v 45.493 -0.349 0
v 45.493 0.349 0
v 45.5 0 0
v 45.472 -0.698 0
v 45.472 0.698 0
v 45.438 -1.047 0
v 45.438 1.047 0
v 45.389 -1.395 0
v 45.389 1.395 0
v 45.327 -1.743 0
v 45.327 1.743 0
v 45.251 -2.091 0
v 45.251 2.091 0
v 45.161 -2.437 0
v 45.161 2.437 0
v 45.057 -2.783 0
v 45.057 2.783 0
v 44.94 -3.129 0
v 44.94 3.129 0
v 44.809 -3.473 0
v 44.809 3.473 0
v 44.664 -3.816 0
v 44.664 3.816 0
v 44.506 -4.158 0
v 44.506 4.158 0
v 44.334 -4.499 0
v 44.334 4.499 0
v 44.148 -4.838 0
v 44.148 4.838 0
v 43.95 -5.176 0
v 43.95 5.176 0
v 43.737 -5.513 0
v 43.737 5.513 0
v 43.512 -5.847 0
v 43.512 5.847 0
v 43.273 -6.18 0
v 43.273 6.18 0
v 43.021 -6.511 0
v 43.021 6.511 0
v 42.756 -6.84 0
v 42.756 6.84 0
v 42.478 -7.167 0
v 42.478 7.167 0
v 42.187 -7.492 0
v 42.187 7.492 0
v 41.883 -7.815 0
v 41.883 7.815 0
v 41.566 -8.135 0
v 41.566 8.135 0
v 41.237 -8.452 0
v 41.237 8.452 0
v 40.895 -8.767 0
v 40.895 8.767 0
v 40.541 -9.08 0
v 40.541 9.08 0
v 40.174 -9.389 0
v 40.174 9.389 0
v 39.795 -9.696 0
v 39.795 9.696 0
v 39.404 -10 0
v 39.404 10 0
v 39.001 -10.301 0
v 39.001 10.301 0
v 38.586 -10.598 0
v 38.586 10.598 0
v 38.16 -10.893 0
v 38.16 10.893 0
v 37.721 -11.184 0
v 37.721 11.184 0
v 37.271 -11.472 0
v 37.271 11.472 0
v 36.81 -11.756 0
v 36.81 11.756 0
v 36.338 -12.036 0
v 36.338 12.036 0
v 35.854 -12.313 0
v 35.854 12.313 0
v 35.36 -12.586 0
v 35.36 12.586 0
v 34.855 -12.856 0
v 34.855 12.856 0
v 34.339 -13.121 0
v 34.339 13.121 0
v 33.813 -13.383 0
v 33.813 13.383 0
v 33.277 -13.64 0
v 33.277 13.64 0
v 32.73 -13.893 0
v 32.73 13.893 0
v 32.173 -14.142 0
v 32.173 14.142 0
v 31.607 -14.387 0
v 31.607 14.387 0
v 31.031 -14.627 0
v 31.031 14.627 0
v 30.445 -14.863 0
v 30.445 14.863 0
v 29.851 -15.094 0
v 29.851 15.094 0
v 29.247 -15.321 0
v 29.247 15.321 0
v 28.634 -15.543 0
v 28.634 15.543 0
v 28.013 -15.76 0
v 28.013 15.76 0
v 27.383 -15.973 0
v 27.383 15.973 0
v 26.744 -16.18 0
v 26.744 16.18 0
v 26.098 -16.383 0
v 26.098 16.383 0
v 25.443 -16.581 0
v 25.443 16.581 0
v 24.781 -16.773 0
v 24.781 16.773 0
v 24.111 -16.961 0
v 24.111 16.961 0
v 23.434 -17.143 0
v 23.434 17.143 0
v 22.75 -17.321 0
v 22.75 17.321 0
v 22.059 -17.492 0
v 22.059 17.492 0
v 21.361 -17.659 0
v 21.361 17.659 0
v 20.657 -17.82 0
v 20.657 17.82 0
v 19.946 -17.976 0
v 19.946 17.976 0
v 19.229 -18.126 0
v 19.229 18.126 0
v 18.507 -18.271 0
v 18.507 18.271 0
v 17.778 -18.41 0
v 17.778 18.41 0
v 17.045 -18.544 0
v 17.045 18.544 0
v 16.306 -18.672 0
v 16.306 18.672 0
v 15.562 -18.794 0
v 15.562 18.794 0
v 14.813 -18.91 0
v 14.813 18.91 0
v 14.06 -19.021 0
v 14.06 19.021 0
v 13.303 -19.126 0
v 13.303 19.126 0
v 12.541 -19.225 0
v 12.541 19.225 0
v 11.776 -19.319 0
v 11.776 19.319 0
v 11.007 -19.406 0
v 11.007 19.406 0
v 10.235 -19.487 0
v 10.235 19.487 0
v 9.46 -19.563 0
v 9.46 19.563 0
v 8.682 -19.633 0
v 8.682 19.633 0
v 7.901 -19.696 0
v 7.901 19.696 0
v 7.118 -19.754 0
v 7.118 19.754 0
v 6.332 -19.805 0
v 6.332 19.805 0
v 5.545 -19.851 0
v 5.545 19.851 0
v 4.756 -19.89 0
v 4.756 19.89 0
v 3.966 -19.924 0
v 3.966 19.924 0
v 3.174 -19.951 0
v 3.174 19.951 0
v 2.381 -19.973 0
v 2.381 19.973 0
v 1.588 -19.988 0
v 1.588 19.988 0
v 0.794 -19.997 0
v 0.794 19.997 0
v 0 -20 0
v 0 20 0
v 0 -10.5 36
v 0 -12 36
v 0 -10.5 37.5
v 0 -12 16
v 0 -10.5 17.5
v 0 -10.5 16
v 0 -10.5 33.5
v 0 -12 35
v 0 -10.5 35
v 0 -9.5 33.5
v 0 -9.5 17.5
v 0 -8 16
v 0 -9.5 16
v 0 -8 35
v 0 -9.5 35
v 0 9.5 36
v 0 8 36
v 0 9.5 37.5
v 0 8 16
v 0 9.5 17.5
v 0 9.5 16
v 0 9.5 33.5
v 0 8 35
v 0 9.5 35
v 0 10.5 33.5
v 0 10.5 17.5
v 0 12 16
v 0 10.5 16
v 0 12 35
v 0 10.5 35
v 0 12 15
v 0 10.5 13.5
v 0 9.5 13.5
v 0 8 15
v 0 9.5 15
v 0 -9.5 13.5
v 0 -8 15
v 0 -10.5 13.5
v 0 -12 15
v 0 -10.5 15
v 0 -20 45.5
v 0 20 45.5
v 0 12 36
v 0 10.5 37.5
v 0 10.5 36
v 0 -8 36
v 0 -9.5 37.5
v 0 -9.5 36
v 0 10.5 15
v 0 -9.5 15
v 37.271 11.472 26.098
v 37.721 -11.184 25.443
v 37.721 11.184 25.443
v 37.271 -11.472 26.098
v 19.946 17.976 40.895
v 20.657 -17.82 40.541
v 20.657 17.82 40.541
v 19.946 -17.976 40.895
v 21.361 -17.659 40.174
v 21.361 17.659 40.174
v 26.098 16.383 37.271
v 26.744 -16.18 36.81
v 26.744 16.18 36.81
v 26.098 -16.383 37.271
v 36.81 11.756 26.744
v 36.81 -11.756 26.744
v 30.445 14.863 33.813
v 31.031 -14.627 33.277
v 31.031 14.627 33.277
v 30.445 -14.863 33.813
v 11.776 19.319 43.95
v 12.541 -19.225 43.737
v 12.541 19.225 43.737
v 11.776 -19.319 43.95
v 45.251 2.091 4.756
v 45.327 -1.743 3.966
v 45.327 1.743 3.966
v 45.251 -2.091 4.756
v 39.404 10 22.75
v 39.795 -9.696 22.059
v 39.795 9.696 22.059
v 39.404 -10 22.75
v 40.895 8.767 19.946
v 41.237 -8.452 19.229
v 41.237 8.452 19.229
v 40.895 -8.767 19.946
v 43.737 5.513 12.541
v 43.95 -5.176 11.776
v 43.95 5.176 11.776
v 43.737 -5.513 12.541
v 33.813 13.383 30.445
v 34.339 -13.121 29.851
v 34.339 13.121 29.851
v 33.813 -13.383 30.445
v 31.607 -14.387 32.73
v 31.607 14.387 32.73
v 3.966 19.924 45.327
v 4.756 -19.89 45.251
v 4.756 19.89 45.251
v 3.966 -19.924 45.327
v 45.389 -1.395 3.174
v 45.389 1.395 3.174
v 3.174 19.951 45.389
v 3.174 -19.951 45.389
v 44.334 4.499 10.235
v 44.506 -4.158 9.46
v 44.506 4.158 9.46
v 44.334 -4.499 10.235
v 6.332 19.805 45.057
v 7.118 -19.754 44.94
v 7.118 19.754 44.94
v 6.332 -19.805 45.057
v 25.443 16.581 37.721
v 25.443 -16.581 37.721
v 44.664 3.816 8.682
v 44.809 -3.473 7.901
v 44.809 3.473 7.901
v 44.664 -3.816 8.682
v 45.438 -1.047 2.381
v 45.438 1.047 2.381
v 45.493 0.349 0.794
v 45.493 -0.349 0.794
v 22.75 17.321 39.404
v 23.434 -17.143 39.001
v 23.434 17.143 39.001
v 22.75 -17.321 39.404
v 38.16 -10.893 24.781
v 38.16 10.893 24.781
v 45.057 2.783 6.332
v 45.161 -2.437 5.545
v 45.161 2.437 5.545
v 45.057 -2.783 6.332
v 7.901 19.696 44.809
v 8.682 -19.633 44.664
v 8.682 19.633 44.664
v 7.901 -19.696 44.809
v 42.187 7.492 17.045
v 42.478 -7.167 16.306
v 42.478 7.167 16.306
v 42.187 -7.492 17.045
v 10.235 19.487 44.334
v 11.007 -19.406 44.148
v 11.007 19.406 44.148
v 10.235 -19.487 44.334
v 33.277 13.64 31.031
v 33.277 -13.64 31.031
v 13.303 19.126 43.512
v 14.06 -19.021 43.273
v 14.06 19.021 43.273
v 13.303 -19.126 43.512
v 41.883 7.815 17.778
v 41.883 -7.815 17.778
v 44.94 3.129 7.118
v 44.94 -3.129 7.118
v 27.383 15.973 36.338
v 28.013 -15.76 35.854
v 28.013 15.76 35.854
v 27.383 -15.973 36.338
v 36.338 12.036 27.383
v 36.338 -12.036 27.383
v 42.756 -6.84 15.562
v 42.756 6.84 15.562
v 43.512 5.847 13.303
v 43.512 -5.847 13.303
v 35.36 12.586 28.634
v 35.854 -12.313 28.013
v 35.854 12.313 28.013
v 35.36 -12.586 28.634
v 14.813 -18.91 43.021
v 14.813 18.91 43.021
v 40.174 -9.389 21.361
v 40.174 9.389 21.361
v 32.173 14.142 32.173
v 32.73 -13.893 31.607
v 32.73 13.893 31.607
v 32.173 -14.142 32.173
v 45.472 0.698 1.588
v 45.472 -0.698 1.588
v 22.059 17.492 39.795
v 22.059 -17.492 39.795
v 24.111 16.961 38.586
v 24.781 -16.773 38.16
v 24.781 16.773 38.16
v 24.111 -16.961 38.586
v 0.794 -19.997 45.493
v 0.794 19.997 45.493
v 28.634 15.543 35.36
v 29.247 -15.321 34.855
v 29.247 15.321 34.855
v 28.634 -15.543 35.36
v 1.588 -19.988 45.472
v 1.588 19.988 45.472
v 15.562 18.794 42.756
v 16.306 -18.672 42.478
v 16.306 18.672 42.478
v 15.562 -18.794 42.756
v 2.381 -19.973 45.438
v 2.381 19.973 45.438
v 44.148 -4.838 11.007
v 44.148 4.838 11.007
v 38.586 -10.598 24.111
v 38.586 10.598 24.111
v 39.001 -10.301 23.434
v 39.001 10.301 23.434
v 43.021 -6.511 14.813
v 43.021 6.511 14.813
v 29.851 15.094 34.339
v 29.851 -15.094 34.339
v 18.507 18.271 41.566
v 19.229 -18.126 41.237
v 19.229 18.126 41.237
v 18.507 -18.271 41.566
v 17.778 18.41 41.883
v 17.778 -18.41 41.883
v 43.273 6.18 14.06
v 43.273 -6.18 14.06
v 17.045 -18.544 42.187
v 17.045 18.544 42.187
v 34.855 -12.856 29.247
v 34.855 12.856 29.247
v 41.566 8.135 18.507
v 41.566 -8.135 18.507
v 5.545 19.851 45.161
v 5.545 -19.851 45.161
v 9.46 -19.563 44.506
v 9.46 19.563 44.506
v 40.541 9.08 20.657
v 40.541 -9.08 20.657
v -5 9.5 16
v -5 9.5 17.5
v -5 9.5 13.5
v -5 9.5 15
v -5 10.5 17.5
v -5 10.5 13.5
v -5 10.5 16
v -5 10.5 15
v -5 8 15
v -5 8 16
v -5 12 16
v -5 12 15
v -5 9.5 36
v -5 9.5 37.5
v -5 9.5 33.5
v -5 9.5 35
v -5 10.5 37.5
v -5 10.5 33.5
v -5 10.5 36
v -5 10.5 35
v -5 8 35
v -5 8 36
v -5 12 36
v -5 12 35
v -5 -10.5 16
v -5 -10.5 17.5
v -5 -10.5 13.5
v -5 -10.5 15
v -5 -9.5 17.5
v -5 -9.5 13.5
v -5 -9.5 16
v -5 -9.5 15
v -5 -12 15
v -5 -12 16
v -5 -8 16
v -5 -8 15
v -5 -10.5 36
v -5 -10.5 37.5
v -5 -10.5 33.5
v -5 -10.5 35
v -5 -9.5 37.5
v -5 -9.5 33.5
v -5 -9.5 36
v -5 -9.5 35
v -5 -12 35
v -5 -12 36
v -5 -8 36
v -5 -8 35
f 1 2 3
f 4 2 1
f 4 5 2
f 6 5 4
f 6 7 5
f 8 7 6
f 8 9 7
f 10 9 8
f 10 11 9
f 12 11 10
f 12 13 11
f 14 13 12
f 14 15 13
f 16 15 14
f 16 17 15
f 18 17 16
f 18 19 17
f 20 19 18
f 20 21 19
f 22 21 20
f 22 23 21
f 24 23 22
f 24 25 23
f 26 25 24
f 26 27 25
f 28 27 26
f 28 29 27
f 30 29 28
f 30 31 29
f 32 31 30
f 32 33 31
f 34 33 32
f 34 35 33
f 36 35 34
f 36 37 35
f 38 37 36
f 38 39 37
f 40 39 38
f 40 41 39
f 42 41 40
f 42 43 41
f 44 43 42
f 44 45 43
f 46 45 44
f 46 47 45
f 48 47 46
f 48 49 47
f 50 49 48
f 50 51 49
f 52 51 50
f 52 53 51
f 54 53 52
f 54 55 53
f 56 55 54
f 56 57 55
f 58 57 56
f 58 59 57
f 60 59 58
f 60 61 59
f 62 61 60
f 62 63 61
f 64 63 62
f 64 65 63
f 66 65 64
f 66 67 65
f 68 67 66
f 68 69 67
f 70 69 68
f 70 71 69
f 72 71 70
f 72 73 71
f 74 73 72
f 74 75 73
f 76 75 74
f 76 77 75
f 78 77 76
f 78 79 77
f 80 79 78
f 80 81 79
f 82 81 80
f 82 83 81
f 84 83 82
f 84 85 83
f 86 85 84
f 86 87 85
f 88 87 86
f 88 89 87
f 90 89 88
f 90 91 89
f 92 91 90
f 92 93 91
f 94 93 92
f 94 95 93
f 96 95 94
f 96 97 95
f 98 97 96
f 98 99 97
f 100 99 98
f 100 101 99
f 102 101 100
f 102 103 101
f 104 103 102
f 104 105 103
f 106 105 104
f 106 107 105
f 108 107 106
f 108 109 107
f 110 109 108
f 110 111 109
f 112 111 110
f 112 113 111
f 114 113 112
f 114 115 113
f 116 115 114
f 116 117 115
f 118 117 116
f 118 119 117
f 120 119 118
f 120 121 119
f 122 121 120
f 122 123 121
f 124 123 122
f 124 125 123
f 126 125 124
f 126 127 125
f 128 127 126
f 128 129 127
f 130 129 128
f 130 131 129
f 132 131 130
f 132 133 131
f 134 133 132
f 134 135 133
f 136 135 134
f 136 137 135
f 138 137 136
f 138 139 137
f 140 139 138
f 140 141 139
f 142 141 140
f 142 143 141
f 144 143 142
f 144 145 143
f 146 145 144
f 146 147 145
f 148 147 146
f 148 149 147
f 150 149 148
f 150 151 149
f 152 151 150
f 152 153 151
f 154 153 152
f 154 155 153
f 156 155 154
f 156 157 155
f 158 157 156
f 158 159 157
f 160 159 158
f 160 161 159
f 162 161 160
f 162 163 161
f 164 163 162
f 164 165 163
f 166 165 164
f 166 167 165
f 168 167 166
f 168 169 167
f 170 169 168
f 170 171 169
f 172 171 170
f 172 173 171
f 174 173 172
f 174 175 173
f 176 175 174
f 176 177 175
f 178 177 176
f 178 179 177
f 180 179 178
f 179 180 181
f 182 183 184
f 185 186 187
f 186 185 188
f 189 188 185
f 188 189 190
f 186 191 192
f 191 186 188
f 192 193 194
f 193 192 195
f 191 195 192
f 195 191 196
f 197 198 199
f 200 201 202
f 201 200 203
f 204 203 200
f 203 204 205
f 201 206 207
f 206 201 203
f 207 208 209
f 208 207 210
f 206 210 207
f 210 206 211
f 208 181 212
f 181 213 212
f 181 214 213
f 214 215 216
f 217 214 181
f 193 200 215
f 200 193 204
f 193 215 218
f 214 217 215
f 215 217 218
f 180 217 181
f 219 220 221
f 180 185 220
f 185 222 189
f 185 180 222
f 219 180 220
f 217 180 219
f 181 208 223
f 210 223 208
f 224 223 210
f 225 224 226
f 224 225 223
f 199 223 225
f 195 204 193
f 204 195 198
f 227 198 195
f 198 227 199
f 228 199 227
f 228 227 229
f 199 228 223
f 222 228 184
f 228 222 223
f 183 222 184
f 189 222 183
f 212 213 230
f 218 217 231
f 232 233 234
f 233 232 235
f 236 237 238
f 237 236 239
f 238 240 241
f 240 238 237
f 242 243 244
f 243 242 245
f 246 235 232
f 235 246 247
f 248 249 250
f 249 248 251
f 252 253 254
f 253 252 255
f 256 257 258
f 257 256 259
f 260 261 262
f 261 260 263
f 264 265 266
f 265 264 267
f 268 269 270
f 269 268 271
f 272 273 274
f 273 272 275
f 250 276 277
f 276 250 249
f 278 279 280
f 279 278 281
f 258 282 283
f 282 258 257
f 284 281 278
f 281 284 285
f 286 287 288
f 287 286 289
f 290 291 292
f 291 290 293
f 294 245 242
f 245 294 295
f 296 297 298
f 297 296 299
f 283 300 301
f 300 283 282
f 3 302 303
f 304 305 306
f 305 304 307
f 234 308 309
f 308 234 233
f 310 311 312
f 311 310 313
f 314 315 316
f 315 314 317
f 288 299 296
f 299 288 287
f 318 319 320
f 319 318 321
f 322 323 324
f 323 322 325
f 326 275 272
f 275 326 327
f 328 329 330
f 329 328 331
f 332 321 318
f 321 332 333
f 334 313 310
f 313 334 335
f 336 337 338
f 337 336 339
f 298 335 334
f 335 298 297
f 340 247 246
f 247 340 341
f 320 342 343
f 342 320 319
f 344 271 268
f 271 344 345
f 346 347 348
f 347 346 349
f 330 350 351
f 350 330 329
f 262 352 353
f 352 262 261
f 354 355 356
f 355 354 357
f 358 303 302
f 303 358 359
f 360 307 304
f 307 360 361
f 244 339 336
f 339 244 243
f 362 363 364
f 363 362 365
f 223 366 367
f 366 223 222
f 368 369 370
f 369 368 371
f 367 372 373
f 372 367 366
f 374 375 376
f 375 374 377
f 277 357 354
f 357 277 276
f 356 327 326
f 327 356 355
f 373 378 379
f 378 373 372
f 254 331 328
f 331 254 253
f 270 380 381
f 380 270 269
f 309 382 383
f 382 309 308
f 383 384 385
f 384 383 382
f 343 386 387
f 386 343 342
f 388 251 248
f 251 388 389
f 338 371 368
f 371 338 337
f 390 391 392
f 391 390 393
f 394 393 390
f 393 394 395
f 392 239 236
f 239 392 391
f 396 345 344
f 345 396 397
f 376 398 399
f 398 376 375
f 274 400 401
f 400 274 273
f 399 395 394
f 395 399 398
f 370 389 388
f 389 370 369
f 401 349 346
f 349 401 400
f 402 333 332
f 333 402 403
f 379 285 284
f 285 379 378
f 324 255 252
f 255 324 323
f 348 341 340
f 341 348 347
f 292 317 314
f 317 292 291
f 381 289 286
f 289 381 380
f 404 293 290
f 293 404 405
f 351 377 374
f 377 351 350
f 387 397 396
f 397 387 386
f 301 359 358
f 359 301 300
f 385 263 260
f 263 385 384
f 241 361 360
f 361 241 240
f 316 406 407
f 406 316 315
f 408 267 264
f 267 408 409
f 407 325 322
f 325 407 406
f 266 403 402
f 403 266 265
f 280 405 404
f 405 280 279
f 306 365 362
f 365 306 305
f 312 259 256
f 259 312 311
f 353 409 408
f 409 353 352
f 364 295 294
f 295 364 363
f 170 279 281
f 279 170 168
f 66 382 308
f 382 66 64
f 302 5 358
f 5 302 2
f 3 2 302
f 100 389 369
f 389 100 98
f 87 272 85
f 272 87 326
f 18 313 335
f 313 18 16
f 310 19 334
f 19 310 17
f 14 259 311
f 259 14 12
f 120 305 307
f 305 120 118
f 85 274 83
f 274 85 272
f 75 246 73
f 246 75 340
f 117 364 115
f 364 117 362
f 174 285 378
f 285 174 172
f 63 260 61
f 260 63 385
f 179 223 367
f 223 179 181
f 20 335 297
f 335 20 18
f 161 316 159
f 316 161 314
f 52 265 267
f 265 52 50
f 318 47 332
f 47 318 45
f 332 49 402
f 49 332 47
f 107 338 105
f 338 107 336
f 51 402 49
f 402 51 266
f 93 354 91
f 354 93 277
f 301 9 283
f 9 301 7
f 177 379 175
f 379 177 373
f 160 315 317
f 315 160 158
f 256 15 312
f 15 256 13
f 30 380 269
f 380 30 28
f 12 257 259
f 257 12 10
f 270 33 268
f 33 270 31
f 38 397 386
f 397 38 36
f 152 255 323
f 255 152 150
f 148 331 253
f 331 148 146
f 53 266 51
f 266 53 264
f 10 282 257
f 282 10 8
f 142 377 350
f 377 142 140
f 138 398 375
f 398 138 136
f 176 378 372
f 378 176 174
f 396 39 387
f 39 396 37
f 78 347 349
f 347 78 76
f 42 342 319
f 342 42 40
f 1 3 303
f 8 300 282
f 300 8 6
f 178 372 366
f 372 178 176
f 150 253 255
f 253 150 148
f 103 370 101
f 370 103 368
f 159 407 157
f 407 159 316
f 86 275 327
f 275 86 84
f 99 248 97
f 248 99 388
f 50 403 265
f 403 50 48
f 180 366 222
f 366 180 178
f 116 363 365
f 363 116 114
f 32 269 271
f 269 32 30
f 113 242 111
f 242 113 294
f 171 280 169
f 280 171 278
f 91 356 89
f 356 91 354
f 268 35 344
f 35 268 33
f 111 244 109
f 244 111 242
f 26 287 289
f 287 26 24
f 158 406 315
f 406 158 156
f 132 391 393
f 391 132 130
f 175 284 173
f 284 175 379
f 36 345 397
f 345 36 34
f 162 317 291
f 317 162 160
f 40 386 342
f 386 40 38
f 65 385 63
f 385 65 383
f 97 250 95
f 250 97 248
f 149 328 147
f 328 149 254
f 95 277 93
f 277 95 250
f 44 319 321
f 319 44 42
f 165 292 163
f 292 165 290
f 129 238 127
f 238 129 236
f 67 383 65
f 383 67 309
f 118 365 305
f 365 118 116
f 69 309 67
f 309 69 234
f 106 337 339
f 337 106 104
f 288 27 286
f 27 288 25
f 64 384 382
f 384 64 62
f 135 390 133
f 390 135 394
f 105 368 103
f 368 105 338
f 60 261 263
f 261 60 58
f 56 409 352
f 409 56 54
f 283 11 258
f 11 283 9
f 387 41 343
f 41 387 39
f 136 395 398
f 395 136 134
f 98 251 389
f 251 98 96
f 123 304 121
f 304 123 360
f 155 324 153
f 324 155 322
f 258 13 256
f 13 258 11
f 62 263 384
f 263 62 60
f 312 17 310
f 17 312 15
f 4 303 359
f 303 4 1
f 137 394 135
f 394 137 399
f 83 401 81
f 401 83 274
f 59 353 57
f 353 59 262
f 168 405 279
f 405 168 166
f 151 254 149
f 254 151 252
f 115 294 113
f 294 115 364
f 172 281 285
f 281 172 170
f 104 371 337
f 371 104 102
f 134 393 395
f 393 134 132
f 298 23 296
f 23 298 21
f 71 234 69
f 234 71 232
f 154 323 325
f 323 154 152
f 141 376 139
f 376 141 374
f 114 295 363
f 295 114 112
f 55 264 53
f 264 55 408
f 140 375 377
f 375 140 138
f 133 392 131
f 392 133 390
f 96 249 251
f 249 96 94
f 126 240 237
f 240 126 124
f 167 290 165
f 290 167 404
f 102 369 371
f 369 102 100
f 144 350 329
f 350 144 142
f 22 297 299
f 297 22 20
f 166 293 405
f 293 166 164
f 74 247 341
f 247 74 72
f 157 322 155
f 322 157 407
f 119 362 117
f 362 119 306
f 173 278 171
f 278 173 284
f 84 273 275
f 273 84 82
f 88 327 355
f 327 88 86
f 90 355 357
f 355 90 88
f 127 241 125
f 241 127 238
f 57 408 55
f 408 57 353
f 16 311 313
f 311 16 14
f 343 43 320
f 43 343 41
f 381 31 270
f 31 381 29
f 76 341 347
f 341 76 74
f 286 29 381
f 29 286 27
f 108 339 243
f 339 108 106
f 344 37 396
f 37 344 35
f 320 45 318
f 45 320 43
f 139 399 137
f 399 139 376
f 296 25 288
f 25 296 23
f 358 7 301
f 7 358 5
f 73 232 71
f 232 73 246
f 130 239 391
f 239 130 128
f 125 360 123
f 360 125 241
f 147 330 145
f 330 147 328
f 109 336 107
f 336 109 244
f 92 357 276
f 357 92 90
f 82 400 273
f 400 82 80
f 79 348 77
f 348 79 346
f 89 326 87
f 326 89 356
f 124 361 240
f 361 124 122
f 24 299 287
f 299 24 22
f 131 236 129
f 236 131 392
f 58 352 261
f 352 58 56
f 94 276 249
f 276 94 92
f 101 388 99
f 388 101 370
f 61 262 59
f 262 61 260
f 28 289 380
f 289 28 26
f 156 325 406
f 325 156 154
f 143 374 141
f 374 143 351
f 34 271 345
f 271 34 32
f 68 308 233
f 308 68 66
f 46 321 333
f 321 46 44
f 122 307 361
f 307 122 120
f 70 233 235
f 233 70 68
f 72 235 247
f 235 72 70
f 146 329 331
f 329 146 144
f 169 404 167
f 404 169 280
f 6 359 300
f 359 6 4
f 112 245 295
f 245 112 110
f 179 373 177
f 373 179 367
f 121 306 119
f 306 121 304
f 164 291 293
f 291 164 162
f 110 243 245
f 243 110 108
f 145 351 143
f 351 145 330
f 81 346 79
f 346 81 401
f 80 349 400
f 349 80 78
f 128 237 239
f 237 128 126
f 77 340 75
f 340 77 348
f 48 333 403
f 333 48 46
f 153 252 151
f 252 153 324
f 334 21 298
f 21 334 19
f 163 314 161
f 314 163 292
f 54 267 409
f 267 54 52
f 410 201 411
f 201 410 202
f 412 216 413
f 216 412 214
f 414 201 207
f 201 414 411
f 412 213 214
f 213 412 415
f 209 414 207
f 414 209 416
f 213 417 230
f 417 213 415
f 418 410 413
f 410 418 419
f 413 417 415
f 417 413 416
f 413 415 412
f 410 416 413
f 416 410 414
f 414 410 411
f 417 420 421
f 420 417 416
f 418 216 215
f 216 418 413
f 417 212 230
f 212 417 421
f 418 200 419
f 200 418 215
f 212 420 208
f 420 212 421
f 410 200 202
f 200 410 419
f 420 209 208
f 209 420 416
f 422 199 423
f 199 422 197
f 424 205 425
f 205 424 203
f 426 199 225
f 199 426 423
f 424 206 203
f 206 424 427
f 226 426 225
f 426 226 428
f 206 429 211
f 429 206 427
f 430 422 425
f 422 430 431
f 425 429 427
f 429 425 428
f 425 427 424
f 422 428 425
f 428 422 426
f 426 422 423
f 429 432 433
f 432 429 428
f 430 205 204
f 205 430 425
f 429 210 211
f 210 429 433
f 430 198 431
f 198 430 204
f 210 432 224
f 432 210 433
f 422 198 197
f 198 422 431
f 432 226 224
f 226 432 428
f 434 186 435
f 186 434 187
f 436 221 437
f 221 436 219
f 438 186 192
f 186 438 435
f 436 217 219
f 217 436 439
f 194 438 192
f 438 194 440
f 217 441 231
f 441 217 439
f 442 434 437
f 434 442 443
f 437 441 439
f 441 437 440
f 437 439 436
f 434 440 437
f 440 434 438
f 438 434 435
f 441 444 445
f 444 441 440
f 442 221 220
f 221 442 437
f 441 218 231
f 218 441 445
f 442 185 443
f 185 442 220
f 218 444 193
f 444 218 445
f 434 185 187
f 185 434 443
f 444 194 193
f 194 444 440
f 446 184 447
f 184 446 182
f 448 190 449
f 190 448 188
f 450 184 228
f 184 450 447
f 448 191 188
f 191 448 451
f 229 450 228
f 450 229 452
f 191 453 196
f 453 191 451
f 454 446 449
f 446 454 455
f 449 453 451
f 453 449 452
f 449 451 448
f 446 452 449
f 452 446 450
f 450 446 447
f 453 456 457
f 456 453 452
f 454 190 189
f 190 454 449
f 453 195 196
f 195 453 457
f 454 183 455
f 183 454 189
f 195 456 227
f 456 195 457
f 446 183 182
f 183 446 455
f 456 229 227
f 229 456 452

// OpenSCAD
// Copyright 2019 Pascal de Bruijn
// Licensed Creative Commons - Attribution - Share Alike

width = 40;
height = 40;

foot_height = 5.5;

plug_depth = 5;
plug_width = 4;

$fn = 360;

module plug ()
{
  rotate([0, 0, 0]) cube([1, plug_depth, plug_width], center = true);
  rotate([0, 90, 0]) cube([1, plug_depth, plug_width], center = true);
}


rotate([0, 0, 270])
union ()
{
  intersection ()
  {
    translate([-0.5*width, 0, 0]) cube([width, height+foot_height, height+foot_height], false);
    rotate([0, 90, 0]) cylinder(width, (height+foot_height), (height+foot_height), true);
    
    translate([0, 0, 0.5*(height+foot_height)]) rotate([0, 0, 90]) scale([2*((height+foot_height)/width), 1, 1]) cylinder(height+foot_height, 0.5*width, 0.5*width, true);
 
  }

  translate([-0.25*width, -plug_depth/2, 0.25*height + foot_height]) plug();
  translate([-0.25*width, -plug_depth/2, 0.75*height + foot_height]) plug();
  translate([ 0.25*width, -plug_depth/2, 0.25*height + foot_height]) plug();
  translate([ 0.25*width, -plug_depth/2, 0.75*height + foot_height]) plug();
}
